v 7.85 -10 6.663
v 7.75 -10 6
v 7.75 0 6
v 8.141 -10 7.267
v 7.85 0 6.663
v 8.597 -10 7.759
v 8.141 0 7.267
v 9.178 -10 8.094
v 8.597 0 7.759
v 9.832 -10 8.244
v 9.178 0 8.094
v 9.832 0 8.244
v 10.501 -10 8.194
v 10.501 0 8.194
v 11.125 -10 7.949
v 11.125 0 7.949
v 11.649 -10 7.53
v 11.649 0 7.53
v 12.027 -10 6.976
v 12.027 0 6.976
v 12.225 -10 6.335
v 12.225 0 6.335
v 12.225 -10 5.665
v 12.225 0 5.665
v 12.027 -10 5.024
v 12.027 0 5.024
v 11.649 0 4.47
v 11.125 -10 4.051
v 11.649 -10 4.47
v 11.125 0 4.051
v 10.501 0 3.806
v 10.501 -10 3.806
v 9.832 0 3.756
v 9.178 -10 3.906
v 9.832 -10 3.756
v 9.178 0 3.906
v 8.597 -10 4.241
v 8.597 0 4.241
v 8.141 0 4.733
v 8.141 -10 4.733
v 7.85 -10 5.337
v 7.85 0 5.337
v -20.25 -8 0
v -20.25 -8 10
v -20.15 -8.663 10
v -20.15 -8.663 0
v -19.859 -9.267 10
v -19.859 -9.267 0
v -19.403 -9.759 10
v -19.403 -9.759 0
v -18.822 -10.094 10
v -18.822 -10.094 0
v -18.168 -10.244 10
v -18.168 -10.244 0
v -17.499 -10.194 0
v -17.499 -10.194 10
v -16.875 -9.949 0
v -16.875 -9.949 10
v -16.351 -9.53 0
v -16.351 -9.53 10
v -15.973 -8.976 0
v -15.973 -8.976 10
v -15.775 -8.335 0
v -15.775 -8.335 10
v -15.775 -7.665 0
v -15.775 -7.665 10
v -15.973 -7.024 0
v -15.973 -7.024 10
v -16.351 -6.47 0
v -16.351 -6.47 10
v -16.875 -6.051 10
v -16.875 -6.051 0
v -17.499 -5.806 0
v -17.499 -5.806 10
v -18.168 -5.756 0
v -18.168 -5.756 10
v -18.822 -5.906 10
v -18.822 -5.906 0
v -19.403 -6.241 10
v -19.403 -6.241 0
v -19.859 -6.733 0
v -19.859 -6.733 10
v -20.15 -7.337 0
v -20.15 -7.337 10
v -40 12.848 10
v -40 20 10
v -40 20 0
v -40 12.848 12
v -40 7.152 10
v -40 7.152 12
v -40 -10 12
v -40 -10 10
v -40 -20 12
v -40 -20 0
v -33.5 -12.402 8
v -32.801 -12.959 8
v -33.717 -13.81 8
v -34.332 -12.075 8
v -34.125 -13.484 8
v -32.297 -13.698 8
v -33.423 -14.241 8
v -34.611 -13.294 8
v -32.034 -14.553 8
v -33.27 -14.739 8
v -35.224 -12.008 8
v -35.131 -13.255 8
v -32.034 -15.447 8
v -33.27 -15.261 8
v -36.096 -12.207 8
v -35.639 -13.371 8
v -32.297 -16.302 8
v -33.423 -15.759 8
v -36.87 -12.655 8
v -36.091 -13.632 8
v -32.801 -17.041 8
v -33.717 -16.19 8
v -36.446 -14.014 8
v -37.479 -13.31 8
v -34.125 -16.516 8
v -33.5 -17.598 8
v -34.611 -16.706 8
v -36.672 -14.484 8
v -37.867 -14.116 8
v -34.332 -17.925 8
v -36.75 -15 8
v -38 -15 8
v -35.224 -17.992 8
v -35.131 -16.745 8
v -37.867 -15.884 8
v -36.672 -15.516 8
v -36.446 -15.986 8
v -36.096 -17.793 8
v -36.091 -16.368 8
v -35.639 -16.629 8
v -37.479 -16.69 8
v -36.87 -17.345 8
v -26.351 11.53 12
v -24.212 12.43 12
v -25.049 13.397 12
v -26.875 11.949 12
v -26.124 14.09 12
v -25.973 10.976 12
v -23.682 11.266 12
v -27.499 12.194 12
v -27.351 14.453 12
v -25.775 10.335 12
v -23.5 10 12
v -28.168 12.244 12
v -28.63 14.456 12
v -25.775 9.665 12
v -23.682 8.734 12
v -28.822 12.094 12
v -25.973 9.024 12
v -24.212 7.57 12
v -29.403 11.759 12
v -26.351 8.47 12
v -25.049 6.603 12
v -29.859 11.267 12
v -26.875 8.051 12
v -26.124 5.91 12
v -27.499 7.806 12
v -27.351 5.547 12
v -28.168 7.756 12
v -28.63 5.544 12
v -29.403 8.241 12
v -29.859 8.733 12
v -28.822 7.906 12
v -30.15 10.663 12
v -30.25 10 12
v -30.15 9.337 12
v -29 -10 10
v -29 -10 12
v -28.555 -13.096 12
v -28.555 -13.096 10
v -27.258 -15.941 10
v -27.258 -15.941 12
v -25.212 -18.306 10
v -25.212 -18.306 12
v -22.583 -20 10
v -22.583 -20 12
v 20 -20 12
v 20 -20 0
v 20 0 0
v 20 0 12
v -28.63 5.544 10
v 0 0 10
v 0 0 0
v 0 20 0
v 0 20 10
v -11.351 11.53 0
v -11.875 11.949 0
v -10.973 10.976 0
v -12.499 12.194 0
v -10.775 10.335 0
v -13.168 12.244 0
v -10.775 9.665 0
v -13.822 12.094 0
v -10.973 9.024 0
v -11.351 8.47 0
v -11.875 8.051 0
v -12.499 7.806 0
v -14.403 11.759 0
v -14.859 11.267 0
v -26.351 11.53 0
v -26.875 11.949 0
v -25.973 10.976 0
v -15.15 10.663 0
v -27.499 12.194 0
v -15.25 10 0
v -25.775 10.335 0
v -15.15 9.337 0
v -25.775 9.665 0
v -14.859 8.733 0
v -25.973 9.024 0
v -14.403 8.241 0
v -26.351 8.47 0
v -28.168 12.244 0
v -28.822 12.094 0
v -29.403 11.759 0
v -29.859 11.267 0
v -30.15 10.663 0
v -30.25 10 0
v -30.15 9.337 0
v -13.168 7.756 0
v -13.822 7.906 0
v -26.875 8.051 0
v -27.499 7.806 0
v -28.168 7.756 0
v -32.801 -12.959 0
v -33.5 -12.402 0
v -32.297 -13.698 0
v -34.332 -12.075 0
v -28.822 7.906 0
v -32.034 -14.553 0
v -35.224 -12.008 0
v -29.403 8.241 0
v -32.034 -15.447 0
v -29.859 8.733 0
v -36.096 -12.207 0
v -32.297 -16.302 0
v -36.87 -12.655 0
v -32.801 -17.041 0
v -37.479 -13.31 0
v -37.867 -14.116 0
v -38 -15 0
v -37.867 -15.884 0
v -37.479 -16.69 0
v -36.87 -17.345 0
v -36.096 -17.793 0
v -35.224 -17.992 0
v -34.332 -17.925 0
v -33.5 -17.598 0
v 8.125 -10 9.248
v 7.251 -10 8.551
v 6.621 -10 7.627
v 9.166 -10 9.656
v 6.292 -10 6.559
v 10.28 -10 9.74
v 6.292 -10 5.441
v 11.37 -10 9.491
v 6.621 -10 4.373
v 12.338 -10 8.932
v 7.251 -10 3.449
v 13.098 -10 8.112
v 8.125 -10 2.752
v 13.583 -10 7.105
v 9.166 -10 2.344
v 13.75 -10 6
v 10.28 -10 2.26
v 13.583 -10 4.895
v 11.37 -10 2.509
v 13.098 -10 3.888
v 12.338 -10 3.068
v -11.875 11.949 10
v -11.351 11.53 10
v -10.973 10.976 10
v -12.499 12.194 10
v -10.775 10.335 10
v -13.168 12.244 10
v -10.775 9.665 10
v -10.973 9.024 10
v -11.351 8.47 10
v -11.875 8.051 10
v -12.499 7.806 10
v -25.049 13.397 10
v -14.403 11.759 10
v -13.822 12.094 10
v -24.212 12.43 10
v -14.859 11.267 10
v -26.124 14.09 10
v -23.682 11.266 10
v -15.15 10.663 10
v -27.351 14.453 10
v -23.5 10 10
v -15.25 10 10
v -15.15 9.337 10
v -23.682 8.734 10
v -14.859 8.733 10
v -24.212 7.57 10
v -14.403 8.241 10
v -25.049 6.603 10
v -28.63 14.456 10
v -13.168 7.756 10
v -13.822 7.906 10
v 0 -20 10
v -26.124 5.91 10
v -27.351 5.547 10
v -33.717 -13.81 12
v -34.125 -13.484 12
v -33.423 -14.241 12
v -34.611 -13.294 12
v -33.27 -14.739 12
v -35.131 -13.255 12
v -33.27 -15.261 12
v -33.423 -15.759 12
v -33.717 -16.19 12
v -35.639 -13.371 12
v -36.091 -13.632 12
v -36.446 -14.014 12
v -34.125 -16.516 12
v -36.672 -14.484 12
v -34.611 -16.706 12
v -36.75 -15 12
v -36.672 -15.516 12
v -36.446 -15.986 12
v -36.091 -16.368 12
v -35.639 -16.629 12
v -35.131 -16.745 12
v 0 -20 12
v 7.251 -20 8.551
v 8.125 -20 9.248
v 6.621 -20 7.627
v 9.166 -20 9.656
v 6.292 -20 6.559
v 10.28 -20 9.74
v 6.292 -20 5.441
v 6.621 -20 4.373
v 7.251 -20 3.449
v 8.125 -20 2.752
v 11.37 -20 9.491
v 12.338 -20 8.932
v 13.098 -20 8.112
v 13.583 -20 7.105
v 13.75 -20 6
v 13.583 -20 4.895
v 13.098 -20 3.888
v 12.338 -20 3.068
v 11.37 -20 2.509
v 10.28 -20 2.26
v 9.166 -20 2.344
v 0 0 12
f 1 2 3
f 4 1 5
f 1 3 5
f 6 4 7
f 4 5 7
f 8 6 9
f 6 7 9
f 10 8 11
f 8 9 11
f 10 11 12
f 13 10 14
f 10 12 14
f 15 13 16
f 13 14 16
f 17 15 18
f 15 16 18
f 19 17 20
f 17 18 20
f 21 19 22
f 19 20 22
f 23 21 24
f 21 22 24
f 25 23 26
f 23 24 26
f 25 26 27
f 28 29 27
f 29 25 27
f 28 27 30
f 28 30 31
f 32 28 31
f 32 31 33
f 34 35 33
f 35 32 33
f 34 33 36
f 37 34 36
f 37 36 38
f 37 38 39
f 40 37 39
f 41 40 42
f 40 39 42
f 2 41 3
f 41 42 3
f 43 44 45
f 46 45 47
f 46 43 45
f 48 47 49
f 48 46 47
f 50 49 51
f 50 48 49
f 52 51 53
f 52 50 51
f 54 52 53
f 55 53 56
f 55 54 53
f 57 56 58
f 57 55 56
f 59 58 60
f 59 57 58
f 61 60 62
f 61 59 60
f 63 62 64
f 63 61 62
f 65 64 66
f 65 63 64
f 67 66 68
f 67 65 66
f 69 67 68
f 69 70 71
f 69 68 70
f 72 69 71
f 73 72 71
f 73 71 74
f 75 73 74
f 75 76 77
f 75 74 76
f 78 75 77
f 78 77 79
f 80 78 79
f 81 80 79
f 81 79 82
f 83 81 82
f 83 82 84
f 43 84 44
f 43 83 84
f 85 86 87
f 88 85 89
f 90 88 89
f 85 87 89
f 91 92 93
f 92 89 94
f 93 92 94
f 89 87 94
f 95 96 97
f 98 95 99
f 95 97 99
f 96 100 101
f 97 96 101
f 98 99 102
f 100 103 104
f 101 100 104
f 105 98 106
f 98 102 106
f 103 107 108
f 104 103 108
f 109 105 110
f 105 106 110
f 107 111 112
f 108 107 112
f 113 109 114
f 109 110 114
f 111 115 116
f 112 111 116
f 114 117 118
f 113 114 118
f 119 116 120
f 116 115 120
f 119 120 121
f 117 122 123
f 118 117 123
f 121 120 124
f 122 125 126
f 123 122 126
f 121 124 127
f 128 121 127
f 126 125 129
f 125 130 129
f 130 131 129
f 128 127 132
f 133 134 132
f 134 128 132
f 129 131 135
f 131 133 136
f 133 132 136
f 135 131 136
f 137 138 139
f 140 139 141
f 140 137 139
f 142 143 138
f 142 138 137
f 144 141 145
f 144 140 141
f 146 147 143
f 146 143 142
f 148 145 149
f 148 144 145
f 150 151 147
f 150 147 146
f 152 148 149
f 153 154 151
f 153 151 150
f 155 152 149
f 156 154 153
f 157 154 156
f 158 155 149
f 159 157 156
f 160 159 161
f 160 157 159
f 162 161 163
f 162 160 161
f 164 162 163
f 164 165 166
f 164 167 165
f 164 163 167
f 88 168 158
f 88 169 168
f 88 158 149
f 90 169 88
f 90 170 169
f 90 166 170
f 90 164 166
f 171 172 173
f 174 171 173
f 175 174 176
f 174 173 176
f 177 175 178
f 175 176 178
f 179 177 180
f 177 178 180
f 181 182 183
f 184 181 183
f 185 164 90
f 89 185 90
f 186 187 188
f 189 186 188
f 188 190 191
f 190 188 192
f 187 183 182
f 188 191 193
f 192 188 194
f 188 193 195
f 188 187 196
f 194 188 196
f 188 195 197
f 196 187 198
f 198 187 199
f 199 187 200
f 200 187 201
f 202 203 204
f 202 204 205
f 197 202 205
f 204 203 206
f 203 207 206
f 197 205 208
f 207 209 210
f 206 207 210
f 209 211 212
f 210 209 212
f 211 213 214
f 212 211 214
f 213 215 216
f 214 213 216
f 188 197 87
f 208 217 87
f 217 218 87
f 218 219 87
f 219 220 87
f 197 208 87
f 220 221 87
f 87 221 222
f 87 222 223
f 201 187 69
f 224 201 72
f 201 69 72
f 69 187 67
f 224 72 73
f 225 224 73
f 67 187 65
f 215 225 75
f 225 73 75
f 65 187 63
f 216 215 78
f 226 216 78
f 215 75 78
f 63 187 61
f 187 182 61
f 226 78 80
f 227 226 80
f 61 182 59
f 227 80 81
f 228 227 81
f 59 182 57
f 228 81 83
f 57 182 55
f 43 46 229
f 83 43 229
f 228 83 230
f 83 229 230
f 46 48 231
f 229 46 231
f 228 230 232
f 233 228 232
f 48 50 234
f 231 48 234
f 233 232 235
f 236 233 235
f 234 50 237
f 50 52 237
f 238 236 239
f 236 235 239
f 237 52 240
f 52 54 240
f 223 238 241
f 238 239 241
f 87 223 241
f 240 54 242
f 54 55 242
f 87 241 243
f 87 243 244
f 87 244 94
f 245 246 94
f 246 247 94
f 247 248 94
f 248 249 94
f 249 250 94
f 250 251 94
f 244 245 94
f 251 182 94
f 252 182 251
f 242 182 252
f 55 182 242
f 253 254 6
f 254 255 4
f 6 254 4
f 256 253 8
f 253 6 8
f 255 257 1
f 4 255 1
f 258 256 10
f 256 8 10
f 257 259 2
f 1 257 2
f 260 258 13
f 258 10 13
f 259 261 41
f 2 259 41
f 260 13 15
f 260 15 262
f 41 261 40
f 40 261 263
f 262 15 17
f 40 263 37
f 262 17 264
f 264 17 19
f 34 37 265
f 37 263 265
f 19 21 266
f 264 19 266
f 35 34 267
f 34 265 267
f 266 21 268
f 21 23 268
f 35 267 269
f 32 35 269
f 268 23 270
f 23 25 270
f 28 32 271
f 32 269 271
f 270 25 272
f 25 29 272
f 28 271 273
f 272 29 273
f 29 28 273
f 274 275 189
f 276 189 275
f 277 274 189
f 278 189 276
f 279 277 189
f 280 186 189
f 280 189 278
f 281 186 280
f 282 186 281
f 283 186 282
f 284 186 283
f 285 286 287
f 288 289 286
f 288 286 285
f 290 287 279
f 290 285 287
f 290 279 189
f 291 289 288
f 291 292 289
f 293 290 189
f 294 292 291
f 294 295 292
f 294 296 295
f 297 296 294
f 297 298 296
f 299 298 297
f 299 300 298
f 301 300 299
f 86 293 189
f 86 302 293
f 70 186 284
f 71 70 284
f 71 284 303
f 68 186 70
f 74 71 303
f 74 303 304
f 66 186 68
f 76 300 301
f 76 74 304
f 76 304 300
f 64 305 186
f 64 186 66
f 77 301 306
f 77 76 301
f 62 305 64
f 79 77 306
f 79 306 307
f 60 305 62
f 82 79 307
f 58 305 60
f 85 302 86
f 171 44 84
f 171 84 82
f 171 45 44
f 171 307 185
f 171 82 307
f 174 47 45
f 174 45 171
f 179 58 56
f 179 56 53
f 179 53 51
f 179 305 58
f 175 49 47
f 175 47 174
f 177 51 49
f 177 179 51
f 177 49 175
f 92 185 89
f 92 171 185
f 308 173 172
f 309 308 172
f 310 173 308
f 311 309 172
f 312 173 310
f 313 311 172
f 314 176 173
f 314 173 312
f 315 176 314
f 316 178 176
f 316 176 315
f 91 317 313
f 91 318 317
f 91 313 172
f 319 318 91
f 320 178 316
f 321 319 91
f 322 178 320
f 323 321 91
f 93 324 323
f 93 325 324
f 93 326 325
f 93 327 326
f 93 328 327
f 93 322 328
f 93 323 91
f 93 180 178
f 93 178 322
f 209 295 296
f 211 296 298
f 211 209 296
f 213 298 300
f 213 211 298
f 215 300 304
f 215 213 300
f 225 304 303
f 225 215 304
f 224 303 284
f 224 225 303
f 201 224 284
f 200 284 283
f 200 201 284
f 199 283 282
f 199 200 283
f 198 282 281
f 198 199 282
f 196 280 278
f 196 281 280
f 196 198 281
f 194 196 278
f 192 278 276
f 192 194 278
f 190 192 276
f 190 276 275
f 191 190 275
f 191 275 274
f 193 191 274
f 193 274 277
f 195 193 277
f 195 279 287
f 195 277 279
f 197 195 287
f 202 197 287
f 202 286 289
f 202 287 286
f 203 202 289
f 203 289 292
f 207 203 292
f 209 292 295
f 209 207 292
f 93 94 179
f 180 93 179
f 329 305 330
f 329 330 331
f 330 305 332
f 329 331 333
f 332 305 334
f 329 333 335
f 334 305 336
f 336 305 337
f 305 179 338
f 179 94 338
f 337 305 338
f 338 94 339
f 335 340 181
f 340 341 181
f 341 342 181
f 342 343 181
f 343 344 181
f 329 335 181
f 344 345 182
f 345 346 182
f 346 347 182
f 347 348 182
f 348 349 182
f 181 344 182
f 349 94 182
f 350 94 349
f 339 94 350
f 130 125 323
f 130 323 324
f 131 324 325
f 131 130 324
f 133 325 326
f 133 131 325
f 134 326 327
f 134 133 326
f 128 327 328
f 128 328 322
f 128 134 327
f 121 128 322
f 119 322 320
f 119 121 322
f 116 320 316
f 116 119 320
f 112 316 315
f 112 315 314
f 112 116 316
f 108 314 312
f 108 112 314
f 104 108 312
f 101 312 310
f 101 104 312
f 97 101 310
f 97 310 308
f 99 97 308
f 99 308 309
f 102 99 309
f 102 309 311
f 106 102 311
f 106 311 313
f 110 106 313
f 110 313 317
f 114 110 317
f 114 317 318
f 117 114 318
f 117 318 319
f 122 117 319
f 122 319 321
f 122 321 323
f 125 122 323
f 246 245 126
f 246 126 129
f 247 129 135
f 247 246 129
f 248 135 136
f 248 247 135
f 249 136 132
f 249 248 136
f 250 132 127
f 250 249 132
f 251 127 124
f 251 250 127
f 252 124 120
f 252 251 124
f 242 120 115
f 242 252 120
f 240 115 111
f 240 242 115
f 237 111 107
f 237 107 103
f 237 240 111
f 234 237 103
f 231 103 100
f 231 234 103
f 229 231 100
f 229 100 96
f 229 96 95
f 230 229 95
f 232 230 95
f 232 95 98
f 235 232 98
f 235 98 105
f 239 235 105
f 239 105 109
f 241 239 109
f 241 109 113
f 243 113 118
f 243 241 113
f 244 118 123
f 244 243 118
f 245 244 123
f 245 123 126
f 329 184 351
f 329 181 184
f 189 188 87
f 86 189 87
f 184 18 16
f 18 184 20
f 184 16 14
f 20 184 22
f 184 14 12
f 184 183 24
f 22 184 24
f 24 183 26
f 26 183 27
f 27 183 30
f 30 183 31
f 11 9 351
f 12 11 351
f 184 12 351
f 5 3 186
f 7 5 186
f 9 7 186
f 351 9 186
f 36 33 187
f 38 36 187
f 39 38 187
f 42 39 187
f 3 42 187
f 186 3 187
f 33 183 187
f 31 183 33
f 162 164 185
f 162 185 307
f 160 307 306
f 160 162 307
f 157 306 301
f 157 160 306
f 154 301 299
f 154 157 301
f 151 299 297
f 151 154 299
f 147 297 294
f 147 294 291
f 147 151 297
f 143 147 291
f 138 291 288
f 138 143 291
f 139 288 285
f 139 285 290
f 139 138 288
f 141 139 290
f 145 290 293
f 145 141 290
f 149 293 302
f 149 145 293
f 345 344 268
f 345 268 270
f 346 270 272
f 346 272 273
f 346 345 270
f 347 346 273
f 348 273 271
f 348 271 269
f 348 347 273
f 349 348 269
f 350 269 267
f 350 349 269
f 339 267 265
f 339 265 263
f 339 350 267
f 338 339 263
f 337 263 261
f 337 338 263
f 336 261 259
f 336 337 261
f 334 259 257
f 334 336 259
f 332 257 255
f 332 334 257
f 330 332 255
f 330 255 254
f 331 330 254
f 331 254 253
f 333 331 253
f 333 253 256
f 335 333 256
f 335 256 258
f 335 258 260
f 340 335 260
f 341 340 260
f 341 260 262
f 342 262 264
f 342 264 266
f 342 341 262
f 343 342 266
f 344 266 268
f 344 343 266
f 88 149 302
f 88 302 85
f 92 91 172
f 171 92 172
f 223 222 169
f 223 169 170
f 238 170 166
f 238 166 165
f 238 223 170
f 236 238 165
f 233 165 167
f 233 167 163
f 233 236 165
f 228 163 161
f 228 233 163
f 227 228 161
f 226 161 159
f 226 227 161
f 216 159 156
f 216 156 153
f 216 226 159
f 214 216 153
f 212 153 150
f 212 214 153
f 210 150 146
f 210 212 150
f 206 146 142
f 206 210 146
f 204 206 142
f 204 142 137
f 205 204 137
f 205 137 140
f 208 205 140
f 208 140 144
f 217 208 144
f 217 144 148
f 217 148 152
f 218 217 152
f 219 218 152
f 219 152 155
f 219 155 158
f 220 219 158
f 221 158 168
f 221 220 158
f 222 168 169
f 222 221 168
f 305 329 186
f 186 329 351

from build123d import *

# Parameters (mm, degrees)
SKETCH_R                       = 2.25
SKETCH_R_2                     = 1.75
PAD_DEPTH                      = 12
POCKET_DEPTH                   = 2
SKETCH002_R                    = 2.25
POCKET002_DEPTH                = 20.001
PART_MIRRORING_PLACEMENT_ANGLE = 180
SKETCH003_R                    = 3
POCKET003_DEPTH                = 8
SKETCH004_R                    = 3.75
POCKET004_DEPTH                = 10


with BuildPart() as pocket002:
    # Sketch → Pad (new body)
    with BuildSketch(Plane.XY):
        Polygon((0, -20), (40, -20), (40, 20), (-20, 20), (-20, 0), (0, 0), align=None)
        with Locations((18, 8)):
            Circle(SKETCH_R, mode=Mode.SUBTRACT)
        with Locations((13, -10)):
            Circle(SKETCH_R, mode=Mode.SUBTRACT)
        with Locations((35, 15)):
            Circle(SKETCH_R_2, mode=Mode.SUBTRACT)
        with Locations((28, -10)):
            Circle(SKETCH_R, mode=Mode.SUBTRACT)
    extrude(amount=PAD_DEPTH)

    # Sketch001 → Pocket (cut)
    with BuildSketch(Plane.XY.offset(12)):
        with BuildLine():
            Line((46, 10), (29, 10))
            ThreePointArc((29, 10), (25.778175, 17.778175), (18, 21))
            Line((18, 21), (0, 21))
            Line((0, 21), (0, -23))
            Line((0, -23), (46, -23))
            Line((46, -23), (46, -12))
            Line((28.629901, -14.455696), (46, -12))
            ThreePointArc((28.629901, -5.544304), (23.5, -10), (28.629901, -14.455696))
            Line((28.629901, -5.544304), (46, -8))
            Line((46, -8), (46, 10))
        make_face()
    extrude(amount=-POCKET_DEPTH, mode=Mode.SUBTRACT)

    # Sketch002 → Pocket002 (cut, through all)
    with BuildSketch(Plane.XZ):
        with Locations((-10, 6)):
            Circle(SKETCH002_R)
    extrude(amount=-POCKET002_DEPTH, mode=Mode.SUBTRACT)


with BuildPart() as pocket004:
    # Part__Mirroring: instance of Pocket002
    add(pocket002.part.mirror(Plane(origin=(10, -0.411961, 0), x_dir=(0, 1, 0), z_dir=(0, 0, 1))))


with BuildPart() as pocket004_1:
    # Part__Mirroring placement: moved
    add(pocket004.part.rotate(Axis((0, 0, 0), (1, 0, 0)), PART_MIRRORING_PLACEMENT_ANGLE))

    # Sketch003 → Pocket003 (cut)
    with BuildSketch(Plane(origin=(0, 0, 0), x_dir=(1, 0, 0), z_dir=(0, 0, -1))):
        with Locations((35, 15)):
            Circle(SKETCH003_R)
    extrude(amount=-POCKET003_DEPTH, mode=Mode.SUBTRACT)

    # Sketch004 → Pocket004 (cut)
    with BuildSketch(Plane(origin=(0, -20, 0), x_dir=(-1, 0, 0), z_dir=(0, -1, 0))):
        with Locations((10, -6)):
            Circle(SKETCH004_R)
    extrude(amount=-POCKET004_DEPTH, mode=Mode.SUBTRACT)


with BuildPart() as part_mirroring001:
    # Part__Mirroring001: instance of Pocket004
    add(pocket004_1.part.mirror(Plane(origin=(0, 0, 0), x_dir=(0, -1, 0), z_dir=(1, 0, 0))))


solid = part_mirroring001.part
